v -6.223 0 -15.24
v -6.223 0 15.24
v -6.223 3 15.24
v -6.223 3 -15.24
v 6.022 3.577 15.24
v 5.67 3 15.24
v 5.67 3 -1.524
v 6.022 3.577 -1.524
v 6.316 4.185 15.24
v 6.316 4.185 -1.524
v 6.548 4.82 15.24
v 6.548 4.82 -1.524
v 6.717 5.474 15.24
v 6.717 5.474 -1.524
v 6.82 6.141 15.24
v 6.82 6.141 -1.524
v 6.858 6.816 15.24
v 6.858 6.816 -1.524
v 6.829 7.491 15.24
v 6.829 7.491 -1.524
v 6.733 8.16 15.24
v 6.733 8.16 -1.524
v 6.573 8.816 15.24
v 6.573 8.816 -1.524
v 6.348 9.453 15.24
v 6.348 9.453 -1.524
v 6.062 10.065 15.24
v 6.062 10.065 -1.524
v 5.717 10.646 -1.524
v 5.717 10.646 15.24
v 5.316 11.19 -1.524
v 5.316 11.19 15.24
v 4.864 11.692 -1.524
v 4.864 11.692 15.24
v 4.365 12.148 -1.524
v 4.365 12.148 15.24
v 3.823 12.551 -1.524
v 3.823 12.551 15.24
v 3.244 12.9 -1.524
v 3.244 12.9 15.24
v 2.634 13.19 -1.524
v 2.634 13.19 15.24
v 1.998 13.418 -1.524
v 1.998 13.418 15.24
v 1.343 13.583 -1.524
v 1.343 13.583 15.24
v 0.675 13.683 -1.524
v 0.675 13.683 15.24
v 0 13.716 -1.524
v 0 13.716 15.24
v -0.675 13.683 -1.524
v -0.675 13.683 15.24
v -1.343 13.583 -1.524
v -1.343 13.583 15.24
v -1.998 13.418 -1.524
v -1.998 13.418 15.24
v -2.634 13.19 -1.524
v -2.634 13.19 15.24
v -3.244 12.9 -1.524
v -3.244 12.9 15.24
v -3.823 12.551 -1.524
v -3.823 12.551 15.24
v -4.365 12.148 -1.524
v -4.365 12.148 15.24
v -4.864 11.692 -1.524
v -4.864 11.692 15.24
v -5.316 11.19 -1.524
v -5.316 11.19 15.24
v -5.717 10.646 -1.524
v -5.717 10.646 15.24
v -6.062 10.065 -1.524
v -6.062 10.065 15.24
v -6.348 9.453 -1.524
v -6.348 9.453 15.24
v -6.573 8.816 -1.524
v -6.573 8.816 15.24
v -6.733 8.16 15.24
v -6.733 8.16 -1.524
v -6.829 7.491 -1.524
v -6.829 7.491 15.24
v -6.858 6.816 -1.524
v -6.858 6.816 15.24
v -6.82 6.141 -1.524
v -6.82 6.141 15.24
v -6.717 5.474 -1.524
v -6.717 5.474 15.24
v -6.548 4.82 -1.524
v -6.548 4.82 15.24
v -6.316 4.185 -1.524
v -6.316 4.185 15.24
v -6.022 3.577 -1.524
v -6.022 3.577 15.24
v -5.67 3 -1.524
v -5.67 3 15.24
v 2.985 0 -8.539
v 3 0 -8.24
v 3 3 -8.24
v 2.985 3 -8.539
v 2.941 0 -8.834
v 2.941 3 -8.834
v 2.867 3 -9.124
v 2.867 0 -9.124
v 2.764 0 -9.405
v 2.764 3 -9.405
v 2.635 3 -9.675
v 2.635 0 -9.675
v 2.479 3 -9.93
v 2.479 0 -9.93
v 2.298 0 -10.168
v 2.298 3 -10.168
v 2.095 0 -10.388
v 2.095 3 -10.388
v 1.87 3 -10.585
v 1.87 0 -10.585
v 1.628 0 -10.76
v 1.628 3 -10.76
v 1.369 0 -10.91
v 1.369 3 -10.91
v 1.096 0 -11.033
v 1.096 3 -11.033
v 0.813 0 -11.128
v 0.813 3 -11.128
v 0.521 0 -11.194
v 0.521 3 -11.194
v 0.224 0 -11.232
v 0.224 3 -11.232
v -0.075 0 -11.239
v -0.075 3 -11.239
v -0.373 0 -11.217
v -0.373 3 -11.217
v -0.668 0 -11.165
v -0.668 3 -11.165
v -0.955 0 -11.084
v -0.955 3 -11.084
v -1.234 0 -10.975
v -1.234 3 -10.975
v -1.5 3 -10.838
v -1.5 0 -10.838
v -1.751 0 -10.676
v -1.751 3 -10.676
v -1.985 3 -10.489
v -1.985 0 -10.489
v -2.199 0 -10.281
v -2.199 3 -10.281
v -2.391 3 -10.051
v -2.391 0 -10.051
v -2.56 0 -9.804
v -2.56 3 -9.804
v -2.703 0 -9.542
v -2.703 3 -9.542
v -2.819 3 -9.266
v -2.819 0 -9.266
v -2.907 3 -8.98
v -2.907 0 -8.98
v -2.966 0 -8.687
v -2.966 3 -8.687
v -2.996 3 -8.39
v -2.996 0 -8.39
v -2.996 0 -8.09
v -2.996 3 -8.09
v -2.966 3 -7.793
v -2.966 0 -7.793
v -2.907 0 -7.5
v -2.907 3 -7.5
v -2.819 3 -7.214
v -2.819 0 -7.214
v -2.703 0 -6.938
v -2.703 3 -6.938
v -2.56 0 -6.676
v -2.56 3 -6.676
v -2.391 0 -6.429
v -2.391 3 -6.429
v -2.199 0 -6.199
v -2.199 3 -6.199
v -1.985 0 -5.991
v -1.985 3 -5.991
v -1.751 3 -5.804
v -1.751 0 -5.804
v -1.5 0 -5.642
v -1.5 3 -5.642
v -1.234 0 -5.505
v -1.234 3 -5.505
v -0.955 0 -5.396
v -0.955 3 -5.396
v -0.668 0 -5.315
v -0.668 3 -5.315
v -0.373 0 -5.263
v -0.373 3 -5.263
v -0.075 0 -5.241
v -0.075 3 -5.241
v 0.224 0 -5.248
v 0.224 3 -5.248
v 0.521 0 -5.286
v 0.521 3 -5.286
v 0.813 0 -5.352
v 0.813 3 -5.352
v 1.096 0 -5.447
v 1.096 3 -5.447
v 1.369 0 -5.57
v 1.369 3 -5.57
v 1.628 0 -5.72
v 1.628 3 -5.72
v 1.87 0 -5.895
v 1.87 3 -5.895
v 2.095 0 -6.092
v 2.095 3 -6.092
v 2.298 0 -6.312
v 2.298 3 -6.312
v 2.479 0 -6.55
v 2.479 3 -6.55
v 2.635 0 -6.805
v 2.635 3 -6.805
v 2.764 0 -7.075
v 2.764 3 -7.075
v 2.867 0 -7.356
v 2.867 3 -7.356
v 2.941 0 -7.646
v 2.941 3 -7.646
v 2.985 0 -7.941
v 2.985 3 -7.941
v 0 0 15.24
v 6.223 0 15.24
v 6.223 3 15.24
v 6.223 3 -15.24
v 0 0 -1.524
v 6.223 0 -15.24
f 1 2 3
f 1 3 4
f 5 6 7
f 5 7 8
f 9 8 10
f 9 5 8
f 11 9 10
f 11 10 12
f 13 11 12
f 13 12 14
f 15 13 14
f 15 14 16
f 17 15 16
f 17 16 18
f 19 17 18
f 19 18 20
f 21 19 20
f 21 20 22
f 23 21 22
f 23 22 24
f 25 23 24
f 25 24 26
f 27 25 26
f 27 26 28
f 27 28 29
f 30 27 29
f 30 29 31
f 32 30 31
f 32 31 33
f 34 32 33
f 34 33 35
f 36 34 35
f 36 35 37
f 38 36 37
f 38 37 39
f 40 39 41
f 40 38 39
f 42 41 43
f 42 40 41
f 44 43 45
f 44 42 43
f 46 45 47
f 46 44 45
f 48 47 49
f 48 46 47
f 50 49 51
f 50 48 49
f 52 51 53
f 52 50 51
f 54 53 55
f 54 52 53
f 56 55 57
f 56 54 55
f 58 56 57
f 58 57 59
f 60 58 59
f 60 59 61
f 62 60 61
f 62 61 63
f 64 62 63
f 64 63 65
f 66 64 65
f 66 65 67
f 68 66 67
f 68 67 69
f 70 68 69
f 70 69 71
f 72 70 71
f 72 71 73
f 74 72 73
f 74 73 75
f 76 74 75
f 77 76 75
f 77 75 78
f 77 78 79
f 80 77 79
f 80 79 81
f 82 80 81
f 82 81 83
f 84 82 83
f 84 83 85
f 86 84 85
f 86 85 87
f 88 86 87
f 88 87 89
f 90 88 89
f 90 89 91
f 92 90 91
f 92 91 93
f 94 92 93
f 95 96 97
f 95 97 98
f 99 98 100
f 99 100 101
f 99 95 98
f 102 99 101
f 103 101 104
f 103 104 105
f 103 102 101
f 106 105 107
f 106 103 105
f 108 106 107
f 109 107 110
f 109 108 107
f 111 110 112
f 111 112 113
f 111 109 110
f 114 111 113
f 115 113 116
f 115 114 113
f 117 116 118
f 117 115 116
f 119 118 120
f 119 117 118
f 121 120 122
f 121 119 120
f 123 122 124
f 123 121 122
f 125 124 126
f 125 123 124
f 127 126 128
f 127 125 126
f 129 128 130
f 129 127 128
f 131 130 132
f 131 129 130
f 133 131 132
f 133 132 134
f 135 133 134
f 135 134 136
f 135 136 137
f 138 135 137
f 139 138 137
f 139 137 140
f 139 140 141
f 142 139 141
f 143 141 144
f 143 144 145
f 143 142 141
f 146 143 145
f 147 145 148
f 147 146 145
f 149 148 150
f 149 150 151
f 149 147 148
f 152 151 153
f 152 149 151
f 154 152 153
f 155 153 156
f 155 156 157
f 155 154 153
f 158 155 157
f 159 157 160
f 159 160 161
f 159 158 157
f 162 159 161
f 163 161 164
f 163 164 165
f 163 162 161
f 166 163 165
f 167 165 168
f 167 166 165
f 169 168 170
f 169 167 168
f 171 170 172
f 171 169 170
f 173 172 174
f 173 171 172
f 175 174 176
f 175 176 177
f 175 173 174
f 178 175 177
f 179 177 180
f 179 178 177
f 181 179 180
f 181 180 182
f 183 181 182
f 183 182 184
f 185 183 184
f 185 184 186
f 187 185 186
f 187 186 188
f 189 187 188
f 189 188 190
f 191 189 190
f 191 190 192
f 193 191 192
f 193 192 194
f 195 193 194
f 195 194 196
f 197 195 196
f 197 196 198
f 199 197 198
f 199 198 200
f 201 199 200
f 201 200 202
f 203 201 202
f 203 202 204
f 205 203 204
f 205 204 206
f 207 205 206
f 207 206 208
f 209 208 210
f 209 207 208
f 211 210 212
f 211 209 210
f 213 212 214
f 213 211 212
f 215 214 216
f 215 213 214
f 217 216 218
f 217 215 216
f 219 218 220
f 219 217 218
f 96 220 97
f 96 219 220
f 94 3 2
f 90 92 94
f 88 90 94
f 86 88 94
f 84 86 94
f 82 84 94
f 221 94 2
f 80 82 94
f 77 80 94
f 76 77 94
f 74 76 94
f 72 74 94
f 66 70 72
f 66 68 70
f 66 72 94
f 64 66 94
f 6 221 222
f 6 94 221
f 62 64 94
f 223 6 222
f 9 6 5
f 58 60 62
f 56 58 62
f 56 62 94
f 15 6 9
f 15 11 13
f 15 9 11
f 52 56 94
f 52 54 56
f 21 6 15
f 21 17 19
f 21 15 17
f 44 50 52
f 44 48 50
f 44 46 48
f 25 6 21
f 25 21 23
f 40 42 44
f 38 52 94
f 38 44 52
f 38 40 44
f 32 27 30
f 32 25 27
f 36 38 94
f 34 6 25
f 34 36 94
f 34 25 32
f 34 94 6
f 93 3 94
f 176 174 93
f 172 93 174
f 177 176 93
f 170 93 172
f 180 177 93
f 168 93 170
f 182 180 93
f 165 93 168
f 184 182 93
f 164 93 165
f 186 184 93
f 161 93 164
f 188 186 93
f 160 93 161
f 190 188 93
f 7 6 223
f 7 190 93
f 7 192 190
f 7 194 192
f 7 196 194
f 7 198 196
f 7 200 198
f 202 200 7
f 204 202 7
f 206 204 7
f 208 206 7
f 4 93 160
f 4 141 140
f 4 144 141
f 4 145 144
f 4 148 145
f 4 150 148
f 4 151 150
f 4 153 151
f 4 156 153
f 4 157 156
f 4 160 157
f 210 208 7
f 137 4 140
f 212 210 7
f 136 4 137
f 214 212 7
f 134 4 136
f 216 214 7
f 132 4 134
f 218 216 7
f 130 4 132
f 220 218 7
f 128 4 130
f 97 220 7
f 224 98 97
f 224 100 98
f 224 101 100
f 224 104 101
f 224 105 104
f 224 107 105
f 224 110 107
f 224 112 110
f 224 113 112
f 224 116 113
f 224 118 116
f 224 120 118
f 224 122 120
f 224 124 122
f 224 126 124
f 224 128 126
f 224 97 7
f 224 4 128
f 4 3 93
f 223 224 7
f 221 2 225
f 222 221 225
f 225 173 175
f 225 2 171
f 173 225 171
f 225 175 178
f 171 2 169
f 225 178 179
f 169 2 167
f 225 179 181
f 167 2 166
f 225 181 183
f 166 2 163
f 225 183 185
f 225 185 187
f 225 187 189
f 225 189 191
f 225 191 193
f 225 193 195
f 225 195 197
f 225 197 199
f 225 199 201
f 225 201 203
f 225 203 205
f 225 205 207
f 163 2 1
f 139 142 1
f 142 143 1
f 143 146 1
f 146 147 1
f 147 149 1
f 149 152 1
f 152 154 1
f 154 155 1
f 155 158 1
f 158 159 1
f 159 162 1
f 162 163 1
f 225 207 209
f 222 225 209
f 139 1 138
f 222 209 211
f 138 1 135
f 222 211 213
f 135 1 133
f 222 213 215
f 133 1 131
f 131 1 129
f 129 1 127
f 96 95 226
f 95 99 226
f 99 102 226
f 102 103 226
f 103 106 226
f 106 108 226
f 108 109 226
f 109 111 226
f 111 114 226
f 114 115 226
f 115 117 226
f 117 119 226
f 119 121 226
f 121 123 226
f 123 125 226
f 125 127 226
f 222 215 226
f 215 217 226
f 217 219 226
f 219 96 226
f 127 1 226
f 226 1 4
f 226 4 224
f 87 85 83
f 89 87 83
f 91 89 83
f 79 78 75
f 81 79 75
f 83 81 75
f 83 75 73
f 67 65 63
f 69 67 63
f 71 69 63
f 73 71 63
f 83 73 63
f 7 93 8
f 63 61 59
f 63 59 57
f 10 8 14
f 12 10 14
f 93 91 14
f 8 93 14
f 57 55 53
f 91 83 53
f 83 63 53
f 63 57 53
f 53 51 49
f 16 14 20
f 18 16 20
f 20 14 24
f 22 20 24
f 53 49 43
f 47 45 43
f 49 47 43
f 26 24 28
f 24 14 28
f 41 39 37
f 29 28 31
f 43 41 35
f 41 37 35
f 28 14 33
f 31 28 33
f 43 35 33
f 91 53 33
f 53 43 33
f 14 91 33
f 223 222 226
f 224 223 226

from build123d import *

# Parameters (mm, degrees)
SKETCH1_W           = 12.446
SKETCH1_H           = 30.48
SKETCH1_R           = 3
BOSS_EXTRUDE1_DEPTH = 3
SKETCH2_R           = 6.858
BOSS_EXTRUDE2_DEPTH = 16.764


with BuildPart() as part:
    # Sketch1 → Boss-Extrude1 (new body)
    with BuildSketch(Plane(origin=(0, 0, 0), x_dir=(1, 0, 0), z_dir=(0, 1, 0))):
        Rectangle(SKETCH1_W, SKETCH1_H)
        with Locations((0, 8.24)):
            Circle(SKETCH1_R, mode=Mode.SUBTRACT)
    extrude(amount=BOSS_EXTRUDE1_DEPTH)

    # Sketch2 → Boss-Extrude2 (add)
    with BuildSketch(Plane.XY.offset(15.24)):
        with Locations((0, 6.858)):
            Circle(SKETCH2_R)
    extrude(amount=-BOSS_EXTRUDE2_DEPTH)


solid = part.part
